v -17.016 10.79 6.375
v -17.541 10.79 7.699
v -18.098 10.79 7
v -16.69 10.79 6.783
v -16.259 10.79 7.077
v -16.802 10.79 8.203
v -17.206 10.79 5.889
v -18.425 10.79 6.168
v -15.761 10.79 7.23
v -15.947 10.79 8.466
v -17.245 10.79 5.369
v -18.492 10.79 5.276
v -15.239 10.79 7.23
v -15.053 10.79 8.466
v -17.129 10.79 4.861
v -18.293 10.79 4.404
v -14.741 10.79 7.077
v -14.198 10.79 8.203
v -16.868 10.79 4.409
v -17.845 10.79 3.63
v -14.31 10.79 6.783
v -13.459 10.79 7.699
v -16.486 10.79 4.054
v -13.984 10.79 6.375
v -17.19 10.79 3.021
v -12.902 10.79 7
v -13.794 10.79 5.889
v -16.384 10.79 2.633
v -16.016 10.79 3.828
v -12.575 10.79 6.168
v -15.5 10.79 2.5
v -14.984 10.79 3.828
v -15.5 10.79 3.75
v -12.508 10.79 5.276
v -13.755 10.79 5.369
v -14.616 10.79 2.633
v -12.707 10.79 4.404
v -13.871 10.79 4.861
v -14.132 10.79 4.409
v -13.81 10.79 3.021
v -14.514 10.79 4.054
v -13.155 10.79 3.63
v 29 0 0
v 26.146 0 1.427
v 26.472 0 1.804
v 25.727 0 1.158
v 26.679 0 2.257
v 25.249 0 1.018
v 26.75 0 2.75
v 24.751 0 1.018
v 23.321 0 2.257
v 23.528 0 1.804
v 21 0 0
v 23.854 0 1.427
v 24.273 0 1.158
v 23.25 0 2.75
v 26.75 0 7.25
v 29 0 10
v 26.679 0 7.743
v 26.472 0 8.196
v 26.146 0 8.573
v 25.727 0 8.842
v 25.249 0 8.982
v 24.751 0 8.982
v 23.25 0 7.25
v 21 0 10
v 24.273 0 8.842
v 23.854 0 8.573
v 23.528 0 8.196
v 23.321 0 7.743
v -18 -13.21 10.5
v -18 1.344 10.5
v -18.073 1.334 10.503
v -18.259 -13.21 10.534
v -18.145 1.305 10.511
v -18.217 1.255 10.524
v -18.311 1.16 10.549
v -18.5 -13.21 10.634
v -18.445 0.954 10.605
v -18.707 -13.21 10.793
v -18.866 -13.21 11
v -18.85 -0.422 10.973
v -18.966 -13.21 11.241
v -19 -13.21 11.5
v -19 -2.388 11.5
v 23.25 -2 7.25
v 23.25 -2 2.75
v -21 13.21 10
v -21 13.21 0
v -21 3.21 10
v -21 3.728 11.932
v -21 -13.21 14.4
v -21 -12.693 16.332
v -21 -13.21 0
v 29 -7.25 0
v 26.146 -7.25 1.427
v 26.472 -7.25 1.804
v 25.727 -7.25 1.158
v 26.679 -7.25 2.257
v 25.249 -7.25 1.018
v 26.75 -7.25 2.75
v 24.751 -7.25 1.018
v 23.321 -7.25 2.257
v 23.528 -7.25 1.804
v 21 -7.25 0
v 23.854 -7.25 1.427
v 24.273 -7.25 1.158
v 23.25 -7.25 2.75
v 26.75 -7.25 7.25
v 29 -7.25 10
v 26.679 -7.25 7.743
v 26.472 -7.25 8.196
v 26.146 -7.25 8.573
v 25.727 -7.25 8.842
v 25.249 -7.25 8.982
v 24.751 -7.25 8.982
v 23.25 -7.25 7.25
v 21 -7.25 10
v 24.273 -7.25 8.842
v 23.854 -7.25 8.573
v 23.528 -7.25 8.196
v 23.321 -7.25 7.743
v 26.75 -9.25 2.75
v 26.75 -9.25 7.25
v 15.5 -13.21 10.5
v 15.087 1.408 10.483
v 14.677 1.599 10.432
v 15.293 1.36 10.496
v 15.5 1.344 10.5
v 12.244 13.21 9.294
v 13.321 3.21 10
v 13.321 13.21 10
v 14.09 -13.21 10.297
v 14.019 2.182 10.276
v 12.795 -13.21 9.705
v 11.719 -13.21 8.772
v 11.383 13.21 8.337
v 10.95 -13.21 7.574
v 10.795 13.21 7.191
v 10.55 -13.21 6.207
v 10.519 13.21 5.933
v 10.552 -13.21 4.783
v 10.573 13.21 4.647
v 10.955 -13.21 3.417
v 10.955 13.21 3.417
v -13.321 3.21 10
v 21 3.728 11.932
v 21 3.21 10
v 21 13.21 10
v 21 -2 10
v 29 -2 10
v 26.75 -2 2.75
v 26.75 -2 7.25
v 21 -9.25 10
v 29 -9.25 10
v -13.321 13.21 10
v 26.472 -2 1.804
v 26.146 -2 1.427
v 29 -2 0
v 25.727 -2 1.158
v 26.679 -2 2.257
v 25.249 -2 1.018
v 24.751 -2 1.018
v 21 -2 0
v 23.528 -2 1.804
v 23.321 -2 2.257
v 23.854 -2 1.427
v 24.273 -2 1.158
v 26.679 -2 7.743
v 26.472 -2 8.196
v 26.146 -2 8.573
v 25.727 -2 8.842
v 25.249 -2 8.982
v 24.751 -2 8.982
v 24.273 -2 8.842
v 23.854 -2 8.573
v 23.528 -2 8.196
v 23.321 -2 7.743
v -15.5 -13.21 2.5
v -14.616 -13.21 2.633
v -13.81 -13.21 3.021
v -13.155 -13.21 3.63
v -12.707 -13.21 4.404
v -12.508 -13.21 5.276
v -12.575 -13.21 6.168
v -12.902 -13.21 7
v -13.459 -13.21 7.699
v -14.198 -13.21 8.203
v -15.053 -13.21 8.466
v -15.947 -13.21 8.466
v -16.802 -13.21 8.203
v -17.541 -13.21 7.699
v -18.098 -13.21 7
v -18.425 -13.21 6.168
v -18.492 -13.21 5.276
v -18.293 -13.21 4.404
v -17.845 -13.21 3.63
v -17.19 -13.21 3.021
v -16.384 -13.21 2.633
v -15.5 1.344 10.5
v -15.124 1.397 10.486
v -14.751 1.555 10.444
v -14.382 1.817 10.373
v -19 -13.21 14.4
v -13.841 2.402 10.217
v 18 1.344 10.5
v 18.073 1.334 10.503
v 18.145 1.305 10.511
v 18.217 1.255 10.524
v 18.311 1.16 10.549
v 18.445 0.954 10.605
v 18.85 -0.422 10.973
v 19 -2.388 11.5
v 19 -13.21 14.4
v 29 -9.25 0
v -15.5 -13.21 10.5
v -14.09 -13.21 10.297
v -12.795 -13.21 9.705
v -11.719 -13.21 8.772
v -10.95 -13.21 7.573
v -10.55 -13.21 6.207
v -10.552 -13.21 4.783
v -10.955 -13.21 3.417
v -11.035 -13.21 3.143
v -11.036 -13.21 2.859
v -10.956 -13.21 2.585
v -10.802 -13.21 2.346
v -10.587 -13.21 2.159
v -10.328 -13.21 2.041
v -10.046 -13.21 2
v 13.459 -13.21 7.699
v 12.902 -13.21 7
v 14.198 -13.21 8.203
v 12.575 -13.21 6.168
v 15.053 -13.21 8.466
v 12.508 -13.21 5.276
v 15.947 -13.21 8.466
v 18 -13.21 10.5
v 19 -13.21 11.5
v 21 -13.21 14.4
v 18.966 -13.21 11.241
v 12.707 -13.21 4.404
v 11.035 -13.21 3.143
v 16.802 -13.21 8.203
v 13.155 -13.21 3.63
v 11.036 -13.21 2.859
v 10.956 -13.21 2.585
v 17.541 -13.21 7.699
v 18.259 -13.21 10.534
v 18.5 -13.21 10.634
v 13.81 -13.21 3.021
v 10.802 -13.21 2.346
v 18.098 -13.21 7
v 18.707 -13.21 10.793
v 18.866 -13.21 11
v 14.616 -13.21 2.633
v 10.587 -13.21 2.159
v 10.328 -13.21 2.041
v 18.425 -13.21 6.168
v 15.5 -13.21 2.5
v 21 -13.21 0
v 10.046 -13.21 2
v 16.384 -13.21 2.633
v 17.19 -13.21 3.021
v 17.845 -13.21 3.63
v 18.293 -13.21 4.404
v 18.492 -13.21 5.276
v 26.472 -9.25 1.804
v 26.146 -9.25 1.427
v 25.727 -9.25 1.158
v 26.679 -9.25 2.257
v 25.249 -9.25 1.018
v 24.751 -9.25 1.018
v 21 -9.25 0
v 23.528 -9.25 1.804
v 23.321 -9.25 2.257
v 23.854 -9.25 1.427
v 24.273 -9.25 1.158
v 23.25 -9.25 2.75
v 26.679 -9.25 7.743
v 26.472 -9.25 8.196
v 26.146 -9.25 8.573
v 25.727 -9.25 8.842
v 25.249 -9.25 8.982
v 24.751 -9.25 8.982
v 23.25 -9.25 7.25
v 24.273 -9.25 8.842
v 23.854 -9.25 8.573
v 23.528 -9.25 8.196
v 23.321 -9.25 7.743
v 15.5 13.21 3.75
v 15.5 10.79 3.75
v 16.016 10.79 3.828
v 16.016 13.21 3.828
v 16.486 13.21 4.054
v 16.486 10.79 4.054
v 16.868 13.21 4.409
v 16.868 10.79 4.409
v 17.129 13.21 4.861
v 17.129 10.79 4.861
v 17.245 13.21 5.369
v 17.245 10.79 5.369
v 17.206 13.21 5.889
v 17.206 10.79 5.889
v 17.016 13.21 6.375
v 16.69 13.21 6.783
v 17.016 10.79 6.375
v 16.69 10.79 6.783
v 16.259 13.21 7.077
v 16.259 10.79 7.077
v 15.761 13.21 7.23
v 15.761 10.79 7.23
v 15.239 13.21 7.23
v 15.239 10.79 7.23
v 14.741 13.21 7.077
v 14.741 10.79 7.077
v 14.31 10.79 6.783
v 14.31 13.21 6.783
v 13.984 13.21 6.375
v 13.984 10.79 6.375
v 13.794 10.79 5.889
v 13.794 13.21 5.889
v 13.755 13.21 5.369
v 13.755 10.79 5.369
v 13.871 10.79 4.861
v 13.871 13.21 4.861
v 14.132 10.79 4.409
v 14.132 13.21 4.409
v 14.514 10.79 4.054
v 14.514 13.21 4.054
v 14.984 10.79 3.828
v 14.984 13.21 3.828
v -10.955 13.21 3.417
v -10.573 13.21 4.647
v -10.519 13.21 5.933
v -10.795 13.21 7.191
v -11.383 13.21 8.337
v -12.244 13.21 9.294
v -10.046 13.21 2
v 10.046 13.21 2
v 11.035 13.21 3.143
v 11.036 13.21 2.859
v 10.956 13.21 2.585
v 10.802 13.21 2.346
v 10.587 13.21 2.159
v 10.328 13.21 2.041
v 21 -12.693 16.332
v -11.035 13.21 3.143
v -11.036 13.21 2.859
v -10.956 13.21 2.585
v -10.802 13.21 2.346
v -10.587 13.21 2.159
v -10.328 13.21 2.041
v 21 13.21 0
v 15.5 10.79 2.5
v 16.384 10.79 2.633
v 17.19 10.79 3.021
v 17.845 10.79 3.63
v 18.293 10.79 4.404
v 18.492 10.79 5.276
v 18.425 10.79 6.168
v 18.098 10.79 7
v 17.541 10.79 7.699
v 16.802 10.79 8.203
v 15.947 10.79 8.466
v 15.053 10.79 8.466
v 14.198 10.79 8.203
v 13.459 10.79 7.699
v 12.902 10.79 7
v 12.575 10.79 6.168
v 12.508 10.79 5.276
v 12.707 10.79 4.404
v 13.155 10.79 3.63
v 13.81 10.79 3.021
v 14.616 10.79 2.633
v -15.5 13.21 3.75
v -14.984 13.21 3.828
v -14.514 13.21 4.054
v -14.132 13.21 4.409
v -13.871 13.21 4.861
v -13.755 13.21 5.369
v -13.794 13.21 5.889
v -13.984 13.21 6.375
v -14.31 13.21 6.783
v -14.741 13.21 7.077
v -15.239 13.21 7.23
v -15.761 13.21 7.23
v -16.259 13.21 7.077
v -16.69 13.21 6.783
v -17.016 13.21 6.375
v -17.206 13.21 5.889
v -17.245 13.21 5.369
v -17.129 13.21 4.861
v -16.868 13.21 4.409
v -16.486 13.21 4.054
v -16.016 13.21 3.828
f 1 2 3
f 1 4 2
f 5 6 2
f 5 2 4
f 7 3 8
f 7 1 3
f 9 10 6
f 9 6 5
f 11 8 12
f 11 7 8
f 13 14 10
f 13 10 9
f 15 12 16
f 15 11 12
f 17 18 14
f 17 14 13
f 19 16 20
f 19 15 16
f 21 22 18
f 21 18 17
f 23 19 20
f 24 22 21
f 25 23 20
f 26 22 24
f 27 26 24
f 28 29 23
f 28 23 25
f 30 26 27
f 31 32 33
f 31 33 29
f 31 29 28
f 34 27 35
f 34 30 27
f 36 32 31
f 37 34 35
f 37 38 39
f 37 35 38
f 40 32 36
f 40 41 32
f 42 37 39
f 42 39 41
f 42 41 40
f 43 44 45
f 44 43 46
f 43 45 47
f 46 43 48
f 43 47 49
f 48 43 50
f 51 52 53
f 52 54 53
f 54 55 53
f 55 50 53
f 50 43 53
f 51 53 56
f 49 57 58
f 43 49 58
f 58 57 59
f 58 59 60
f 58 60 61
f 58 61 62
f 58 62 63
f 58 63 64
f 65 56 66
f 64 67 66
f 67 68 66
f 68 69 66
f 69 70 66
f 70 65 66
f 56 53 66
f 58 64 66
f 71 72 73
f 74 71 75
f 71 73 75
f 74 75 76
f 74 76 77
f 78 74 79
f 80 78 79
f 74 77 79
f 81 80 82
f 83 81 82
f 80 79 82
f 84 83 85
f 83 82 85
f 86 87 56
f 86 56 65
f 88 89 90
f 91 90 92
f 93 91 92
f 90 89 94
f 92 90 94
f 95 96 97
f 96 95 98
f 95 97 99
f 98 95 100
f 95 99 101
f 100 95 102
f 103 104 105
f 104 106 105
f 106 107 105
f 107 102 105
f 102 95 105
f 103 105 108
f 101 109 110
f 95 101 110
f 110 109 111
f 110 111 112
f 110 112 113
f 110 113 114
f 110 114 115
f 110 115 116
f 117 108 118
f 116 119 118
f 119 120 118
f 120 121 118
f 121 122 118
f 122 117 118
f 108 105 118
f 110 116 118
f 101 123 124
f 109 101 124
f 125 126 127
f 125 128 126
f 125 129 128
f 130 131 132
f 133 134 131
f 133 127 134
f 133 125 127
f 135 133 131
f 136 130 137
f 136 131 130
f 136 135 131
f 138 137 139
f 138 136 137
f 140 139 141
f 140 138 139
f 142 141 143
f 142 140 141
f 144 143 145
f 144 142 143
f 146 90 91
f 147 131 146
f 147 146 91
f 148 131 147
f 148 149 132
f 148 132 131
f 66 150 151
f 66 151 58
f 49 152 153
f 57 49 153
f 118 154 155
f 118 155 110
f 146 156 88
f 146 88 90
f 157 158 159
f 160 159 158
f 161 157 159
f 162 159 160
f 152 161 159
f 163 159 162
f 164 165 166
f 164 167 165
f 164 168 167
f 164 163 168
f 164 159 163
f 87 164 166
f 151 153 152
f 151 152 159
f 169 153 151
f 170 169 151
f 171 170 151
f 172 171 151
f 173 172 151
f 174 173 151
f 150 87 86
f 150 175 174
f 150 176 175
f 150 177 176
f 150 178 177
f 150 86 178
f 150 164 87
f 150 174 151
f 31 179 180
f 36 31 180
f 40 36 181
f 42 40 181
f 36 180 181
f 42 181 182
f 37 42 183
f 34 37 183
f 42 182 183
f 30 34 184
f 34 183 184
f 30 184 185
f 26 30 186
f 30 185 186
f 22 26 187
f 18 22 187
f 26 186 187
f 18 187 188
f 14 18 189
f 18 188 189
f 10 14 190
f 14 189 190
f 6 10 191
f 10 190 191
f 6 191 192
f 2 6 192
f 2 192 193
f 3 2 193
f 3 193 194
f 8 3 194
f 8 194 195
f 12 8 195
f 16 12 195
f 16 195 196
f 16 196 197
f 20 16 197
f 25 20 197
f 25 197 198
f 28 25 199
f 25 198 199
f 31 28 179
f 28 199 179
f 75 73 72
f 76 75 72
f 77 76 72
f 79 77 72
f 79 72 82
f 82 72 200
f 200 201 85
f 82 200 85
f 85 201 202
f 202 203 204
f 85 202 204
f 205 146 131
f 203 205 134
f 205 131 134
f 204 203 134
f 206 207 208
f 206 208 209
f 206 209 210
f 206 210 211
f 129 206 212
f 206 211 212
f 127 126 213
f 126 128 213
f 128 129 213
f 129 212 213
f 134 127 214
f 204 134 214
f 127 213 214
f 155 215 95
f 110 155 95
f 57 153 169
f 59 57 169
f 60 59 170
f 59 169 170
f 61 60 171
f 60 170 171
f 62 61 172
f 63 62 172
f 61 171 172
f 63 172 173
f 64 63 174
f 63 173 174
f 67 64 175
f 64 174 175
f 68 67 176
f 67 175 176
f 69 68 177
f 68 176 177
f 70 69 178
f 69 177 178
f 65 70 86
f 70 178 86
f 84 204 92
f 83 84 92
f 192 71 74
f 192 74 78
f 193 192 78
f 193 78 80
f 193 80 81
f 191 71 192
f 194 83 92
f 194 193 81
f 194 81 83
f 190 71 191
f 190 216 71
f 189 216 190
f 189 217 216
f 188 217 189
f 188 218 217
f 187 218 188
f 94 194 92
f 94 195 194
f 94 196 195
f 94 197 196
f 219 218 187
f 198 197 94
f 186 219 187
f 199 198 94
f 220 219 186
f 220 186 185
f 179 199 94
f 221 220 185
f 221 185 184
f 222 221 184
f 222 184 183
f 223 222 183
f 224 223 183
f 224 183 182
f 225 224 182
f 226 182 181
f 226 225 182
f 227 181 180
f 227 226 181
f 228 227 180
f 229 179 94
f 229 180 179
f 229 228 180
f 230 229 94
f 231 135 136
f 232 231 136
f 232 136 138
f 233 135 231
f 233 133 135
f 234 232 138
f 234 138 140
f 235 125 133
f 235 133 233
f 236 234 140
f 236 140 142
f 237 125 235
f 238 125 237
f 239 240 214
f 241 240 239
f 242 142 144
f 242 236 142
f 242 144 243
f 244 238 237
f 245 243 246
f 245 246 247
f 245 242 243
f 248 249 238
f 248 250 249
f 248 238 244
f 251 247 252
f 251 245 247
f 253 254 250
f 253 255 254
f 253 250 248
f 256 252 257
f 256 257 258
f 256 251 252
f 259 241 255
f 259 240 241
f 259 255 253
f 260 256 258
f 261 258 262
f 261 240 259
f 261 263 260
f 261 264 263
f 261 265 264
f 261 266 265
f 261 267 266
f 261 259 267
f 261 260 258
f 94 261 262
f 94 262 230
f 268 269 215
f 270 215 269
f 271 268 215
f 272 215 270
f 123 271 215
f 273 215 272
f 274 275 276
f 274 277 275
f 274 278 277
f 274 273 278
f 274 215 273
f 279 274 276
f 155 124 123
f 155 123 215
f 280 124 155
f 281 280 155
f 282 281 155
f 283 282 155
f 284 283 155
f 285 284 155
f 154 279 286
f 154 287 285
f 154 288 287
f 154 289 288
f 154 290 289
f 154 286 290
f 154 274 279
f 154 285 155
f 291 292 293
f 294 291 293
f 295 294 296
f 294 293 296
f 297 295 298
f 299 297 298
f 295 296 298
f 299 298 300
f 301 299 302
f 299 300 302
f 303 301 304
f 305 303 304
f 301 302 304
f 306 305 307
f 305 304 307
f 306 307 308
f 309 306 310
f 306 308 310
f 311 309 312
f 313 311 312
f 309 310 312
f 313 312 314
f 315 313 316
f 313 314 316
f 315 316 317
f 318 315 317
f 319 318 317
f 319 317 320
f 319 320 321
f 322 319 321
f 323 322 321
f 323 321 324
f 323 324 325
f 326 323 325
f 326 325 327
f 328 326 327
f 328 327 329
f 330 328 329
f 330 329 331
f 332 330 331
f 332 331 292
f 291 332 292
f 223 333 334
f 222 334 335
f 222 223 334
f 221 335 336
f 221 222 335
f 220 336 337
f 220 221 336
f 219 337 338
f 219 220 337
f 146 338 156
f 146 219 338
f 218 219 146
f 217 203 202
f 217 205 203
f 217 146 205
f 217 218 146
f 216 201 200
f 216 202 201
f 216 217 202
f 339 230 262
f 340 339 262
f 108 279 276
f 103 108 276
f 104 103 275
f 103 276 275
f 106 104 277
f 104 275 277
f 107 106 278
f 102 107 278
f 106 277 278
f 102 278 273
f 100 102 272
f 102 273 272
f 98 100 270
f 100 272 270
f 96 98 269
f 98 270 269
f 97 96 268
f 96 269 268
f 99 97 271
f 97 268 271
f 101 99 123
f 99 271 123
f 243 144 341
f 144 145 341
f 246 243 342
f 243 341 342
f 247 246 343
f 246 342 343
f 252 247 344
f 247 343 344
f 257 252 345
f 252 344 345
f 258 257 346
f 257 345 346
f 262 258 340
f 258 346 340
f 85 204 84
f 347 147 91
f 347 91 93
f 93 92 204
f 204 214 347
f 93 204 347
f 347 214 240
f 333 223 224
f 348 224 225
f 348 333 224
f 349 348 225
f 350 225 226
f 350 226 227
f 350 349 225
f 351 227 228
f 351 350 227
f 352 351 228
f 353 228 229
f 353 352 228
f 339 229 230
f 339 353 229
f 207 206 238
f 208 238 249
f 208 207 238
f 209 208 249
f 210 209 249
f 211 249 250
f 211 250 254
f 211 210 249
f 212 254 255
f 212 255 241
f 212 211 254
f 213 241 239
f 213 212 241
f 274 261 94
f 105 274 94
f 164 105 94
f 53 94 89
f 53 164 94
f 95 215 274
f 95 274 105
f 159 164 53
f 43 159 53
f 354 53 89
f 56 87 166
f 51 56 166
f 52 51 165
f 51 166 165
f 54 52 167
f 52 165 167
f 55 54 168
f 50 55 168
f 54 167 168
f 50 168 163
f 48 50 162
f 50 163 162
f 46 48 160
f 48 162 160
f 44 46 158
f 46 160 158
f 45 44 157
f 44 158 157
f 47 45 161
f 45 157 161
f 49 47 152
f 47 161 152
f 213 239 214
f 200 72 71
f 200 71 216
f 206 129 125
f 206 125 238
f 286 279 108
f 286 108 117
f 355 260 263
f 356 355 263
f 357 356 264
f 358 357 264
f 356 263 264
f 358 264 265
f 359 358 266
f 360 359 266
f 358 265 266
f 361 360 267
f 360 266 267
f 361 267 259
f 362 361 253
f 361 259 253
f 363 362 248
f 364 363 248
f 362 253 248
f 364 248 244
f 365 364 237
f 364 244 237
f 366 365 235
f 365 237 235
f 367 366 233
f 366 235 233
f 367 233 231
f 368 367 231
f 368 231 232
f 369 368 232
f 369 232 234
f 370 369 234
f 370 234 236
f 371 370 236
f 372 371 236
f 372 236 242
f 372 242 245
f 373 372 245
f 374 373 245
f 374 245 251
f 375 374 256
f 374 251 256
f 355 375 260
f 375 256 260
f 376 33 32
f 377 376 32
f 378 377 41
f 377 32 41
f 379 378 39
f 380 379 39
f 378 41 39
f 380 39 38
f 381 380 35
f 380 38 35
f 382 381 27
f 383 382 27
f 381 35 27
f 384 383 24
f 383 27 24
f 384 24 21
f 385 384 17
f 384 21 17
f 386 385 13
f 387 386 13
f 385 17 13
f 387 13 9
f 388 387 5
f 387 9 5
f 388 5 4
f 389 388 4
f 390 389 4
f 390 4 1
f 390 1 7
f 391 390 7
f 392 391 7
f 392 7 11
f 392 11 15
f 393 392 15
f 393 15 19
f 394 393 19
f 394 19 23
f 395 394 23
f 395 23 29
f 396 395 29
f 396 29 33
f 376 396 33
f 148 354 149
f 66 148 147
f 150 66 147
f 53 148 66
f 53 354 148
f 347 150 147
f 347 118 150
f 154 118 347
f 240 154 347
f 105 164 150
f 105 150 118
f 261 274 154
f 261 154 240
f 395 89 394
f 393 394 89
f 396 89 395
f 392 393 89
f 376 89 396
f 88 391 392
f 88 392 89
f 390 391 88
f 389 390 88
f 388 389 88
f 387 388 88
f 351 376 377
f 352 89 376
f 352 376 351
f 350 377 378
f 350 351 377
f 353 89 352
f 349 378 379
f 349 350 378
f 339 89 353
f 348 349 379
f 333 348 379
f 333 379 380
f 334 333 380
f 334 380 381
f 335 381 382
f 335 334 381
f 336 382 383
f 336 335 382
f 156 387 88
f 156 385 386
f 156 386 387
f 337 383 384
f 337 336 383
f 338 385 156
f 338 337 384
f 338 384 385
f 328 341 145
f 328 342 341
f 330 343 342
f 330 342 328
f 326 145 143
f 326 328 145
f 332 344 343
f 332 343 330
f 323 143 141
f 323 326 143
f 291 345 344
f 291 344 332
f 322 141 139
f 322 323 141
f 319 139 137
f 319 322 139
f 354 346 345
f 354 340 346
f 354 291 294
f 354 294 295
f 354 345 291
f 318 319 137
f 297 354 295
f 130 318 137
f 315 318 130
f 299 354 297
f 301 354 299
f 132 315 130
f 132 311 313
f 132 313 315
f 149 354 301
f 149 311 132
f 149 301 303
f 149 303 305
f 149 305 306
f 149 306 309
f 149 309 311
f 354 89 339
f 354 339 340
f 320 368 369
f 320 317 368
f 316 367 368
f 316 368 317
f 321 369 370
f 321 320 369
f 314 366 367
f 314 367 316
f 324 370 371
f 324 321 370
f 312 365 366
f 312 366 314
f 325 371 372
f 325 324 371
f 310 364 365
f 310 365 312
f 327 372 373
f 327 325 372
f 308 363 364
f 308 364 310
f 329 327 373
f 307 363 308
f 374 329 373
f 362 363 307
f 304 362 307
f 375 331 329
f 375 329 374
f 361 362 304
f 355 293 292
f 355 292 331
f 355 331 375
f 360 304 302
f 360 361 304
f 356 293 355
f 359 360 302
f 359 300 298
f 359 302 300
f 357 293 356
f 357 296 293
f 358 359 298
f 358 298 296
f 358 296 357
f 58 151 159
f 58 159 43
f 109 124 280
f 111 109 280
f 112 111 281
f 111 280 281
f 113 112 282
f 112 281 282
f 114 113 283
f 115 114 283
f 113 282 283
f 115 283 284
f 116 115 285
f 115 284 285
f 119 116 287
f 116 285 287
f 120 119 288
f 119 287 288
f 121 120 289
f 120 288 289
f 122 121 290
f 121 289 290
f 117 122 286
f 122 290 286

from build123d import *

# Parameters (mm, degrees)
PAD002_DEPTH    = 21
SKETCH005_R     = 3
POCKET002_DEPTH = 24
POCKET003_DEPTH = 26.421739
SKETCH007_R     = 1.75
POCKET004_DEPTH = 2.421739
FILLET001_R     = 1
FILLET002_R     = 1
SKETCH008_W     = 17
SKETCH008_H     = 42
PAD003_DEPTH    = 2
SKETCH013_W     = 2
SKETCH013_H     = 10
PAD006_DEPTH    = 8
POCKET007_DEPTH = 22.46137


with BuildPart() as part:
    # Sketch004 → Pad002 (new body, symmetric)
    with BuildSketch(Plane.YZ):
        Polygon((-13.21037, 0), (13.21037, 0), (13.21037, 10), (3.21037, 10), (-13.21037, 14.399924), align=None)
    extrude(amount=PAD002_DEPTH, both=True)

    # Sketch005 (on Face5 of Pad002) → Pocket002 (cut)
    with BuildSketch(Plane(origin=(0, -13.21037, 0), x_dir=(0, 0, -1), z_dir=(0, -1, 0))):
        with Locations((-5.5, -15.5)):
            Circle(SKETCH005_R)
        with Locations((-5.5, 15.5)):
            Circle(SKETCH005_R)
    extrude(amount=-POCKET002_DEPTH, mode=Mode.SUBTRACT)

    # Sketch006 (on Face2 of Pocket002) → Pocket003 (cut, through all)
    with BuildSketch(Plane(origin=(0, -13.21037, 0), x_dir=(0, 0, -1), z_dir=(0, -1, 0))):
        with BuildLine():
            Line((-2, -11.929286), (-2, 11.929286))
            ThreePointArc((-10.5, 15.50003), (-7.436506, 10.890234), (-2, 11.929286))
            Line((-10.5, 15.50003), (-10.5, 19))
            Line((-10.5, 19), (-14.399924, 19))
            Line((-14.399924, 19), (-14.399924, -19))
            Line((-14.399924, -19), (-10.5, -19))
            Line((-10.5, -19), (-10.5, -15.5))
            ThreePointArc((-2, -11.929286), (-7.436492, -10.890228), (-10.5, -15.5))
        make_face()
    extrude(amount=-POCKET003_DEPTH, mode=Mode.SUBTRACT)

    # Sketch007 (on Face21 of Pocket003) → Pocket004 (cut, through all)
    with BuildSketch(Plane(origin=(0, 10.78963, 0), x_dir=(0, 0, -1), z_dir=(0, -1, 0))):
        with Locations((-5.5, 15.5)):
            Circle(SKETCH007_R)
        with Locations((-5.5, -15.5)):
            Circle(SKETCH007_R)
    extrude(amount=-POCKET004_DEPTH, mode=Mode.SUBTRACT)

    # Fillet001
    fillet001_edges = [part.edges().sort_by_distance(p)[0] for p in [
        (-11.929286, 0, 2),
        (11.929286, 0, 2),
    ]]
    fillet(fillet001_edges, radius=FILLET001_R)

    # Fillet002
    fillet002_edges = [part.edges().sort_by_distance(p)[0] for p in [
        (-19, -5.933013, 10.5),
        (19, -5.933013, 10.5),
    ]]
    fillet(fillet002_edges, radius=FILLET002_R)

    # Sketch008 (on Face15 of Fillet002) → Pad003 (join)
    with BuildSketch(Plane(origin=(0, 2.715054, 10.132719), x_dir=(0, -0.965926, 0.258819), z_dir=(0, 0.258819, 0.965926))):
        with Locations((7.987212, 0)):
            Rectangle(SKETCH008_W, SKETCH008_H)
    extrude(amount=PAD003_DEPTH)

    # Sketch013 (on Face10 of Pad003) → Pad006 (join)
    with BuildSketch(Plane.YZ.offset(21)):
        with Locations((-8.25, 5)):
            Rectangle(SKETCH013_W, SKETCH013_H)
        with Locations((-1, 5)):
            Rectangle(SKETCH013_W, SKETCH013_H)
    extrude(amount=PAD006_DEPTH)

    # Sketch014 (on Face33 of Pad006) → Pocket007 (cut, through all)
    with BuildSketch(Plane(origin=(0, -9.25, 0), x_dir=(0, 0, -1), z_dir=(0, -1, 0))):
        with BuildLine():
            ThreePointArc((-2.75, 23.25), (-1, 25), (-2.75, 26.75))
            Line((-2.75, 26.75), (-7.25, 26.75))
            ThreePointArc((-7.25, 26.75), (-9, 25), (-7.25, 23.25))
            Line((-2.75, 23.25), (-7.25, 23.25))
        make_face()
    extrude(amount=-POCKET007_DEPTH, mode=Mode.SUBTRACT)


solid = part.part
